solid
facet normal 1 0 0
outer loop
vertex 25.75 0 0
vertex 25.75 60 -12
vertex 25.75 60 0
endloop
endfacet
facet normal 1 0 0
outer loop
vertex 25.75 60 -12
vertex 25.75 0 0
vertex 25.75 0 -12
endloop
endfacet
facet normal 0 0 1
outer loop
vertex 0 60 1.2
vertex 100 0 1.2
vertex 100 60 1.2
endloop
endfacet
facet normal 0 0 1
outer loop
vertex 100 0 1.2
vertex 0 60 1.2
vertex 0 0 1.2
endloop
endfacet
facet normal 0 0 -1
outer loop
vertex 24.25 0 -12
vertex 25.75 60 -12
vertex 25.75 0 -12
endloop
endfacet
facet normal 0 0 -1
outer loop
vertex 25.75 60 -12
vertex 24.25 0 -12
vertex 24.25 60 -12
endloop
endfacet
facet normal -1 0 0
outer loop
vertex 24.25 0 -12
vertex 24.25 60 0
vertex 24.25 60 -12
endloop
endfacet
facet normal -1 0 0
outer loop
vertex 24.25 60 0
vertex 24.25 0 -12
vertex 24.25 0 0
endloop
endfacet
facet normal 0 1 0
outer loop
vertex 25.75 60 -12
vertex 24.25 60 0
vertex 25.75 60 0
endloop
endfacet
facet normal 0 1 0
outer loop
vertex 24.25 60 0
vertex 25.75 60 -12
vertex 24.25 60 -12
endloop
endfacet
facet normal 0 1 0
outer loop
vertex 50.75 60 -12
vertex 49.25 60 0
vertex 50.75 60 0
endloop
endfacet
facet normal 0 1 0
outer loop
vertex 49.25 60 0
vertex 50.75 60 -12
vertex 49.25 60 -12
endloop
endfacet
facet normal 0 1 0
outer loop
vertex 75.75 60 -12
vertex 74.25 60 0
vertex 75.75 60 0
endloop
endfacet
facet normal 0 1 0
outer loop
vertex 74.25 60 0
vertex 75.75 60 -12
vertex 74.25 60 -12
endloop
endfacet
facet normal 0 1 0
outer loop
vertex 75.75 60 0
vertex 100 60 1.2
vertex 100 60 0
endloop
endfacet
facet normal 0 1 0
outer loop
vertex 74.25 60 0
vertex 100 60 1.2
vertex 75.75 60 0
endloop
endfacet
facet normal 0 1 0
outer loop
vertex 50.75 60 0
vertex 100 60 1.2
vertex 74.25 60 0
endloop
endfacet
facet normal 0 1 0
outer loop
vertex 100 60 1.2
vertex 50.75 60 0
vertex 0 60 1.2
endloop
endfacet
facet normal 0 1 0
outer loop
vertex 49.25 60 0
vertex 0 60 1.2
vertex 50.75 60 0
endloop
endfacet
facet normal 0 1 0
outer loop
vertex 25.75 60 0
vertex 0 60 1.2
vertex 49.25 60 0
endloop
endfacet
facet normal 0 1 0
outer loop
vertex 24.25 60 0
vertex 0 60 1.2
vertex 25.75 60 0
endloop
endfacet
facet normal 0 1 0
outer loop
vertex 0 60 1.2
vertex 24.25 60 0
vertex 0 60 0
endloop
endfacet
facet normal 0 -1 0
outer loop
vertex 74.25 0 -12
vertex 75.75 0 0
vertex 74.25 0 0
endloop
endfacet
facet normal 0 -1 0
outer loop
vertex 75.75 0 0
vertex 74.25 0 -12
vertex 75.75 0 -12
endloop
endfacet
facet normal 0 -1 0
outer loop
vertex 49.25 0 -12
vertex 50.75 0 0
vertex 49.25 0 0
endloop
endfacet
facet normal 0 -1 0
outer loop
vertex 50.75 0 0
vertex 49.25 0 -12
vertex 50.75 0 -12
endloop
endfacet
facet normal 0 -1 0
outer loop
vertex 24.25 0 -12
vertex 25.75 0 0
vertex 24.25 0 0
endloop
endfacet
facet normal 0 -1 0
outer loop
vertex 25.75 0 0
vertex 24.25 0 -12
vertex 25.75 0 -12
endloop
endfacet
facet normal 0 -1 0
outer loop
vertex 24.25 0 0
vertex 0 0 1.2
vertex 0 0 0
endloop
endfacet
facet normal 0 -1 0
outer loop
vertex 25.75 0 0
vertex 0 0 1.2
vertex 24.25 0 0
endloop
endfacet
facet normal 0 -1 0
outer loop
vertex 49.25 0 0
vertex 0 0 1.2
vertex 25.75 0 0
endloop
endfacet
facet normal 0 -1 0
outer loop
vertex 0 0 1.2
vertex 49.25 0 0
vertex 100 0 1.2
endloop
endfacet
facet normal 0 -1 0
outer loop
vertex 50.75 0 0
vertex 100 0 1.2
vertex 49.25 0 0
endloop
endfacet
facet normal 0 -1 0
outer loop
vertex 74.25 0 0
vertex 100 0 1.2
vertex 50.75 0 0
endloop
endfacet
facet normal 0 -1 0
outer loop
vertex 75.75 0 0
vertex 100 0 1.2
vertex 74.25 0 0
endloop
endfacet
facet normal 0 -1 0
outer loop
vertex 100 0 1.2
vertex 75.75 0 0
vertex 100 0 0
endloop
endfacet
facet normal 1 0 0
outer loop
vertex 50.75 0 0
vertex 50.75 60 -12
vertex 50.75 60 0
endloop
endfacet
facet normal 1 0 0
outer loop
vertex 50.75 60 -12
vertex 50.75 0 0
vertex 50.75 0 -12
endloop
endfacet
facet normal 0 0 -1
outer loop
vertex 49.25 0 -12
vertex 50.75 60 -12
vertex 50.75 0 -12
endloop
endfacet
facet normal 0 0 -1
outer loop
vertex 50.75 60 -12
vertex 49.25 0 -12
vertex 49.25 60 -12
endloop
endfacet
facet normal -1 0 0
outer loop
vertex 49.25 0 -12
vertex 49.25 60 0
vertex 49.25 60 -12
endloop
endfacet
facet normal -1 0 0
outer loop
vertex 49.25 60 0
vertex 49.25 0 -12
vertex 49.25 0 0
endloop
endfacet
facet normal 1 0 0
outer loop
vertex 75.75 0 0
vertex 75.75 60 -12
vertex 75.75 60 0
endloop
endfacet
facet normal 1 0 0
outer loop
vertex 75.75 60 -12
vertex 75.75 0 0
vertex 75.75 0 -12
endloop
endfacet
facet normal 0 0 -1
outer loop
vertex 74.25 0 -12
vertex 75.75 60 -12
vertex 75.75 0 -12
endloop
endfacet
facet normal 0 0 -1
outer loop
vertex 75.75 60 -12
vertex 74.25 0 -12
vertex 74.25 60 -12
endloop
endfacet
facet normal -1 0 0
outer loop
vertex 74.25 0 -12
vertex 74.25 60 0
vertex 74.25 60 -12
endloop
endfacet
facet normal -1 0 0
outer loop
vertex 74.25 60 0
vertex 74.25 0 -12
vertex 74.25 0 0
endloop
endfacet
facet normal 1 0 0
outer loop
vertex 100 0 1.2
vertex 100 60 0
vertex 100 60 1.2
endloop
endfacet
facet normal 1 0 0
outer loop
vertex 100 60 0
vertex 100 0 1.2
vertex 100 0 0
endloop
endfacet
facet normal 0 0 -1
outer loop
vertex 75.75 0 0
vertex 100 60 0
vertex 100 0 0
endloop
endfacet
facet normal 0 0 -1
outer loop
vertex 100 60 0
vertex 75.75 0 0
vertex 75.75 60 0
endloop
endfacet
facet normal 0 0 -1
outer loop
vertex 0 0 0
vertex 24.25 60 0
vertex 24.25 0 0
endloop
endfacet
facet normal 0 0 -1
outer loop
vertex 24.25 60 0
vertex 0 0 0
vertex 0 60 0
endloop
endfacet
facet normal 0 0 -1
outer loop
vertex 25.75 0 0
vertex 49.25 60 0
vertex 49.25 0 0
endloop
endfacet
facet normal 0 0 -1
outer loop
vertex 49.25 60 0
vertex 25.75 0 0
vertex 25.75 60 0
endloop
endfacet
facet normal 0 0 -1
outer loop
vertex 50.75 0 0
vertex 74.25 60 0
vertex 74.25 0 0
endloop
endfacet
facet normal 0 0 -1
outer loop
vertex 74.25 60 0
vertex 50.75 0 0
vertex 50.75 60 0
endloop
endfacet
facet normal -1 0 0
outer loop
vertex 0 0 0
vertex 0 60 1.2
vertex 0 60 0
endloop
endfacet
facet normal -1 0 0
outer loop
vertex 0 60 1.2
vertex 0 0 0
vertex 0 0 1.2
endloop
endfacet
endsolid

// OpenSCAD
$fn = 32;

// ----------------------------------------------------------------------
// Ribbed panel: 1.2 mm panel
// ----------------------------------------------------------------------

// --- parameters (mm) ---
panel_l = 100;            // panel length, X
panel_w = 60;             // panel width, Y
panel_t = 1.2;            // panel thickness, Z
rib_t = 1.5;              // rib thickness
rib_h = 12;               // rib height below the panel
ribs = 3;                 // number of ribs

total_h = panel_t + rib_h;  // overall height

union() {
  cube([panel_l, panel_w, panel_t]);
  for (i = [1 : ribs])
    translate([i * panel_l / (ribs + 1) - rib_t / 2, 0, -rib_h])
      cube([rib_t, panel_w, rib_h + panel_t]);
}
